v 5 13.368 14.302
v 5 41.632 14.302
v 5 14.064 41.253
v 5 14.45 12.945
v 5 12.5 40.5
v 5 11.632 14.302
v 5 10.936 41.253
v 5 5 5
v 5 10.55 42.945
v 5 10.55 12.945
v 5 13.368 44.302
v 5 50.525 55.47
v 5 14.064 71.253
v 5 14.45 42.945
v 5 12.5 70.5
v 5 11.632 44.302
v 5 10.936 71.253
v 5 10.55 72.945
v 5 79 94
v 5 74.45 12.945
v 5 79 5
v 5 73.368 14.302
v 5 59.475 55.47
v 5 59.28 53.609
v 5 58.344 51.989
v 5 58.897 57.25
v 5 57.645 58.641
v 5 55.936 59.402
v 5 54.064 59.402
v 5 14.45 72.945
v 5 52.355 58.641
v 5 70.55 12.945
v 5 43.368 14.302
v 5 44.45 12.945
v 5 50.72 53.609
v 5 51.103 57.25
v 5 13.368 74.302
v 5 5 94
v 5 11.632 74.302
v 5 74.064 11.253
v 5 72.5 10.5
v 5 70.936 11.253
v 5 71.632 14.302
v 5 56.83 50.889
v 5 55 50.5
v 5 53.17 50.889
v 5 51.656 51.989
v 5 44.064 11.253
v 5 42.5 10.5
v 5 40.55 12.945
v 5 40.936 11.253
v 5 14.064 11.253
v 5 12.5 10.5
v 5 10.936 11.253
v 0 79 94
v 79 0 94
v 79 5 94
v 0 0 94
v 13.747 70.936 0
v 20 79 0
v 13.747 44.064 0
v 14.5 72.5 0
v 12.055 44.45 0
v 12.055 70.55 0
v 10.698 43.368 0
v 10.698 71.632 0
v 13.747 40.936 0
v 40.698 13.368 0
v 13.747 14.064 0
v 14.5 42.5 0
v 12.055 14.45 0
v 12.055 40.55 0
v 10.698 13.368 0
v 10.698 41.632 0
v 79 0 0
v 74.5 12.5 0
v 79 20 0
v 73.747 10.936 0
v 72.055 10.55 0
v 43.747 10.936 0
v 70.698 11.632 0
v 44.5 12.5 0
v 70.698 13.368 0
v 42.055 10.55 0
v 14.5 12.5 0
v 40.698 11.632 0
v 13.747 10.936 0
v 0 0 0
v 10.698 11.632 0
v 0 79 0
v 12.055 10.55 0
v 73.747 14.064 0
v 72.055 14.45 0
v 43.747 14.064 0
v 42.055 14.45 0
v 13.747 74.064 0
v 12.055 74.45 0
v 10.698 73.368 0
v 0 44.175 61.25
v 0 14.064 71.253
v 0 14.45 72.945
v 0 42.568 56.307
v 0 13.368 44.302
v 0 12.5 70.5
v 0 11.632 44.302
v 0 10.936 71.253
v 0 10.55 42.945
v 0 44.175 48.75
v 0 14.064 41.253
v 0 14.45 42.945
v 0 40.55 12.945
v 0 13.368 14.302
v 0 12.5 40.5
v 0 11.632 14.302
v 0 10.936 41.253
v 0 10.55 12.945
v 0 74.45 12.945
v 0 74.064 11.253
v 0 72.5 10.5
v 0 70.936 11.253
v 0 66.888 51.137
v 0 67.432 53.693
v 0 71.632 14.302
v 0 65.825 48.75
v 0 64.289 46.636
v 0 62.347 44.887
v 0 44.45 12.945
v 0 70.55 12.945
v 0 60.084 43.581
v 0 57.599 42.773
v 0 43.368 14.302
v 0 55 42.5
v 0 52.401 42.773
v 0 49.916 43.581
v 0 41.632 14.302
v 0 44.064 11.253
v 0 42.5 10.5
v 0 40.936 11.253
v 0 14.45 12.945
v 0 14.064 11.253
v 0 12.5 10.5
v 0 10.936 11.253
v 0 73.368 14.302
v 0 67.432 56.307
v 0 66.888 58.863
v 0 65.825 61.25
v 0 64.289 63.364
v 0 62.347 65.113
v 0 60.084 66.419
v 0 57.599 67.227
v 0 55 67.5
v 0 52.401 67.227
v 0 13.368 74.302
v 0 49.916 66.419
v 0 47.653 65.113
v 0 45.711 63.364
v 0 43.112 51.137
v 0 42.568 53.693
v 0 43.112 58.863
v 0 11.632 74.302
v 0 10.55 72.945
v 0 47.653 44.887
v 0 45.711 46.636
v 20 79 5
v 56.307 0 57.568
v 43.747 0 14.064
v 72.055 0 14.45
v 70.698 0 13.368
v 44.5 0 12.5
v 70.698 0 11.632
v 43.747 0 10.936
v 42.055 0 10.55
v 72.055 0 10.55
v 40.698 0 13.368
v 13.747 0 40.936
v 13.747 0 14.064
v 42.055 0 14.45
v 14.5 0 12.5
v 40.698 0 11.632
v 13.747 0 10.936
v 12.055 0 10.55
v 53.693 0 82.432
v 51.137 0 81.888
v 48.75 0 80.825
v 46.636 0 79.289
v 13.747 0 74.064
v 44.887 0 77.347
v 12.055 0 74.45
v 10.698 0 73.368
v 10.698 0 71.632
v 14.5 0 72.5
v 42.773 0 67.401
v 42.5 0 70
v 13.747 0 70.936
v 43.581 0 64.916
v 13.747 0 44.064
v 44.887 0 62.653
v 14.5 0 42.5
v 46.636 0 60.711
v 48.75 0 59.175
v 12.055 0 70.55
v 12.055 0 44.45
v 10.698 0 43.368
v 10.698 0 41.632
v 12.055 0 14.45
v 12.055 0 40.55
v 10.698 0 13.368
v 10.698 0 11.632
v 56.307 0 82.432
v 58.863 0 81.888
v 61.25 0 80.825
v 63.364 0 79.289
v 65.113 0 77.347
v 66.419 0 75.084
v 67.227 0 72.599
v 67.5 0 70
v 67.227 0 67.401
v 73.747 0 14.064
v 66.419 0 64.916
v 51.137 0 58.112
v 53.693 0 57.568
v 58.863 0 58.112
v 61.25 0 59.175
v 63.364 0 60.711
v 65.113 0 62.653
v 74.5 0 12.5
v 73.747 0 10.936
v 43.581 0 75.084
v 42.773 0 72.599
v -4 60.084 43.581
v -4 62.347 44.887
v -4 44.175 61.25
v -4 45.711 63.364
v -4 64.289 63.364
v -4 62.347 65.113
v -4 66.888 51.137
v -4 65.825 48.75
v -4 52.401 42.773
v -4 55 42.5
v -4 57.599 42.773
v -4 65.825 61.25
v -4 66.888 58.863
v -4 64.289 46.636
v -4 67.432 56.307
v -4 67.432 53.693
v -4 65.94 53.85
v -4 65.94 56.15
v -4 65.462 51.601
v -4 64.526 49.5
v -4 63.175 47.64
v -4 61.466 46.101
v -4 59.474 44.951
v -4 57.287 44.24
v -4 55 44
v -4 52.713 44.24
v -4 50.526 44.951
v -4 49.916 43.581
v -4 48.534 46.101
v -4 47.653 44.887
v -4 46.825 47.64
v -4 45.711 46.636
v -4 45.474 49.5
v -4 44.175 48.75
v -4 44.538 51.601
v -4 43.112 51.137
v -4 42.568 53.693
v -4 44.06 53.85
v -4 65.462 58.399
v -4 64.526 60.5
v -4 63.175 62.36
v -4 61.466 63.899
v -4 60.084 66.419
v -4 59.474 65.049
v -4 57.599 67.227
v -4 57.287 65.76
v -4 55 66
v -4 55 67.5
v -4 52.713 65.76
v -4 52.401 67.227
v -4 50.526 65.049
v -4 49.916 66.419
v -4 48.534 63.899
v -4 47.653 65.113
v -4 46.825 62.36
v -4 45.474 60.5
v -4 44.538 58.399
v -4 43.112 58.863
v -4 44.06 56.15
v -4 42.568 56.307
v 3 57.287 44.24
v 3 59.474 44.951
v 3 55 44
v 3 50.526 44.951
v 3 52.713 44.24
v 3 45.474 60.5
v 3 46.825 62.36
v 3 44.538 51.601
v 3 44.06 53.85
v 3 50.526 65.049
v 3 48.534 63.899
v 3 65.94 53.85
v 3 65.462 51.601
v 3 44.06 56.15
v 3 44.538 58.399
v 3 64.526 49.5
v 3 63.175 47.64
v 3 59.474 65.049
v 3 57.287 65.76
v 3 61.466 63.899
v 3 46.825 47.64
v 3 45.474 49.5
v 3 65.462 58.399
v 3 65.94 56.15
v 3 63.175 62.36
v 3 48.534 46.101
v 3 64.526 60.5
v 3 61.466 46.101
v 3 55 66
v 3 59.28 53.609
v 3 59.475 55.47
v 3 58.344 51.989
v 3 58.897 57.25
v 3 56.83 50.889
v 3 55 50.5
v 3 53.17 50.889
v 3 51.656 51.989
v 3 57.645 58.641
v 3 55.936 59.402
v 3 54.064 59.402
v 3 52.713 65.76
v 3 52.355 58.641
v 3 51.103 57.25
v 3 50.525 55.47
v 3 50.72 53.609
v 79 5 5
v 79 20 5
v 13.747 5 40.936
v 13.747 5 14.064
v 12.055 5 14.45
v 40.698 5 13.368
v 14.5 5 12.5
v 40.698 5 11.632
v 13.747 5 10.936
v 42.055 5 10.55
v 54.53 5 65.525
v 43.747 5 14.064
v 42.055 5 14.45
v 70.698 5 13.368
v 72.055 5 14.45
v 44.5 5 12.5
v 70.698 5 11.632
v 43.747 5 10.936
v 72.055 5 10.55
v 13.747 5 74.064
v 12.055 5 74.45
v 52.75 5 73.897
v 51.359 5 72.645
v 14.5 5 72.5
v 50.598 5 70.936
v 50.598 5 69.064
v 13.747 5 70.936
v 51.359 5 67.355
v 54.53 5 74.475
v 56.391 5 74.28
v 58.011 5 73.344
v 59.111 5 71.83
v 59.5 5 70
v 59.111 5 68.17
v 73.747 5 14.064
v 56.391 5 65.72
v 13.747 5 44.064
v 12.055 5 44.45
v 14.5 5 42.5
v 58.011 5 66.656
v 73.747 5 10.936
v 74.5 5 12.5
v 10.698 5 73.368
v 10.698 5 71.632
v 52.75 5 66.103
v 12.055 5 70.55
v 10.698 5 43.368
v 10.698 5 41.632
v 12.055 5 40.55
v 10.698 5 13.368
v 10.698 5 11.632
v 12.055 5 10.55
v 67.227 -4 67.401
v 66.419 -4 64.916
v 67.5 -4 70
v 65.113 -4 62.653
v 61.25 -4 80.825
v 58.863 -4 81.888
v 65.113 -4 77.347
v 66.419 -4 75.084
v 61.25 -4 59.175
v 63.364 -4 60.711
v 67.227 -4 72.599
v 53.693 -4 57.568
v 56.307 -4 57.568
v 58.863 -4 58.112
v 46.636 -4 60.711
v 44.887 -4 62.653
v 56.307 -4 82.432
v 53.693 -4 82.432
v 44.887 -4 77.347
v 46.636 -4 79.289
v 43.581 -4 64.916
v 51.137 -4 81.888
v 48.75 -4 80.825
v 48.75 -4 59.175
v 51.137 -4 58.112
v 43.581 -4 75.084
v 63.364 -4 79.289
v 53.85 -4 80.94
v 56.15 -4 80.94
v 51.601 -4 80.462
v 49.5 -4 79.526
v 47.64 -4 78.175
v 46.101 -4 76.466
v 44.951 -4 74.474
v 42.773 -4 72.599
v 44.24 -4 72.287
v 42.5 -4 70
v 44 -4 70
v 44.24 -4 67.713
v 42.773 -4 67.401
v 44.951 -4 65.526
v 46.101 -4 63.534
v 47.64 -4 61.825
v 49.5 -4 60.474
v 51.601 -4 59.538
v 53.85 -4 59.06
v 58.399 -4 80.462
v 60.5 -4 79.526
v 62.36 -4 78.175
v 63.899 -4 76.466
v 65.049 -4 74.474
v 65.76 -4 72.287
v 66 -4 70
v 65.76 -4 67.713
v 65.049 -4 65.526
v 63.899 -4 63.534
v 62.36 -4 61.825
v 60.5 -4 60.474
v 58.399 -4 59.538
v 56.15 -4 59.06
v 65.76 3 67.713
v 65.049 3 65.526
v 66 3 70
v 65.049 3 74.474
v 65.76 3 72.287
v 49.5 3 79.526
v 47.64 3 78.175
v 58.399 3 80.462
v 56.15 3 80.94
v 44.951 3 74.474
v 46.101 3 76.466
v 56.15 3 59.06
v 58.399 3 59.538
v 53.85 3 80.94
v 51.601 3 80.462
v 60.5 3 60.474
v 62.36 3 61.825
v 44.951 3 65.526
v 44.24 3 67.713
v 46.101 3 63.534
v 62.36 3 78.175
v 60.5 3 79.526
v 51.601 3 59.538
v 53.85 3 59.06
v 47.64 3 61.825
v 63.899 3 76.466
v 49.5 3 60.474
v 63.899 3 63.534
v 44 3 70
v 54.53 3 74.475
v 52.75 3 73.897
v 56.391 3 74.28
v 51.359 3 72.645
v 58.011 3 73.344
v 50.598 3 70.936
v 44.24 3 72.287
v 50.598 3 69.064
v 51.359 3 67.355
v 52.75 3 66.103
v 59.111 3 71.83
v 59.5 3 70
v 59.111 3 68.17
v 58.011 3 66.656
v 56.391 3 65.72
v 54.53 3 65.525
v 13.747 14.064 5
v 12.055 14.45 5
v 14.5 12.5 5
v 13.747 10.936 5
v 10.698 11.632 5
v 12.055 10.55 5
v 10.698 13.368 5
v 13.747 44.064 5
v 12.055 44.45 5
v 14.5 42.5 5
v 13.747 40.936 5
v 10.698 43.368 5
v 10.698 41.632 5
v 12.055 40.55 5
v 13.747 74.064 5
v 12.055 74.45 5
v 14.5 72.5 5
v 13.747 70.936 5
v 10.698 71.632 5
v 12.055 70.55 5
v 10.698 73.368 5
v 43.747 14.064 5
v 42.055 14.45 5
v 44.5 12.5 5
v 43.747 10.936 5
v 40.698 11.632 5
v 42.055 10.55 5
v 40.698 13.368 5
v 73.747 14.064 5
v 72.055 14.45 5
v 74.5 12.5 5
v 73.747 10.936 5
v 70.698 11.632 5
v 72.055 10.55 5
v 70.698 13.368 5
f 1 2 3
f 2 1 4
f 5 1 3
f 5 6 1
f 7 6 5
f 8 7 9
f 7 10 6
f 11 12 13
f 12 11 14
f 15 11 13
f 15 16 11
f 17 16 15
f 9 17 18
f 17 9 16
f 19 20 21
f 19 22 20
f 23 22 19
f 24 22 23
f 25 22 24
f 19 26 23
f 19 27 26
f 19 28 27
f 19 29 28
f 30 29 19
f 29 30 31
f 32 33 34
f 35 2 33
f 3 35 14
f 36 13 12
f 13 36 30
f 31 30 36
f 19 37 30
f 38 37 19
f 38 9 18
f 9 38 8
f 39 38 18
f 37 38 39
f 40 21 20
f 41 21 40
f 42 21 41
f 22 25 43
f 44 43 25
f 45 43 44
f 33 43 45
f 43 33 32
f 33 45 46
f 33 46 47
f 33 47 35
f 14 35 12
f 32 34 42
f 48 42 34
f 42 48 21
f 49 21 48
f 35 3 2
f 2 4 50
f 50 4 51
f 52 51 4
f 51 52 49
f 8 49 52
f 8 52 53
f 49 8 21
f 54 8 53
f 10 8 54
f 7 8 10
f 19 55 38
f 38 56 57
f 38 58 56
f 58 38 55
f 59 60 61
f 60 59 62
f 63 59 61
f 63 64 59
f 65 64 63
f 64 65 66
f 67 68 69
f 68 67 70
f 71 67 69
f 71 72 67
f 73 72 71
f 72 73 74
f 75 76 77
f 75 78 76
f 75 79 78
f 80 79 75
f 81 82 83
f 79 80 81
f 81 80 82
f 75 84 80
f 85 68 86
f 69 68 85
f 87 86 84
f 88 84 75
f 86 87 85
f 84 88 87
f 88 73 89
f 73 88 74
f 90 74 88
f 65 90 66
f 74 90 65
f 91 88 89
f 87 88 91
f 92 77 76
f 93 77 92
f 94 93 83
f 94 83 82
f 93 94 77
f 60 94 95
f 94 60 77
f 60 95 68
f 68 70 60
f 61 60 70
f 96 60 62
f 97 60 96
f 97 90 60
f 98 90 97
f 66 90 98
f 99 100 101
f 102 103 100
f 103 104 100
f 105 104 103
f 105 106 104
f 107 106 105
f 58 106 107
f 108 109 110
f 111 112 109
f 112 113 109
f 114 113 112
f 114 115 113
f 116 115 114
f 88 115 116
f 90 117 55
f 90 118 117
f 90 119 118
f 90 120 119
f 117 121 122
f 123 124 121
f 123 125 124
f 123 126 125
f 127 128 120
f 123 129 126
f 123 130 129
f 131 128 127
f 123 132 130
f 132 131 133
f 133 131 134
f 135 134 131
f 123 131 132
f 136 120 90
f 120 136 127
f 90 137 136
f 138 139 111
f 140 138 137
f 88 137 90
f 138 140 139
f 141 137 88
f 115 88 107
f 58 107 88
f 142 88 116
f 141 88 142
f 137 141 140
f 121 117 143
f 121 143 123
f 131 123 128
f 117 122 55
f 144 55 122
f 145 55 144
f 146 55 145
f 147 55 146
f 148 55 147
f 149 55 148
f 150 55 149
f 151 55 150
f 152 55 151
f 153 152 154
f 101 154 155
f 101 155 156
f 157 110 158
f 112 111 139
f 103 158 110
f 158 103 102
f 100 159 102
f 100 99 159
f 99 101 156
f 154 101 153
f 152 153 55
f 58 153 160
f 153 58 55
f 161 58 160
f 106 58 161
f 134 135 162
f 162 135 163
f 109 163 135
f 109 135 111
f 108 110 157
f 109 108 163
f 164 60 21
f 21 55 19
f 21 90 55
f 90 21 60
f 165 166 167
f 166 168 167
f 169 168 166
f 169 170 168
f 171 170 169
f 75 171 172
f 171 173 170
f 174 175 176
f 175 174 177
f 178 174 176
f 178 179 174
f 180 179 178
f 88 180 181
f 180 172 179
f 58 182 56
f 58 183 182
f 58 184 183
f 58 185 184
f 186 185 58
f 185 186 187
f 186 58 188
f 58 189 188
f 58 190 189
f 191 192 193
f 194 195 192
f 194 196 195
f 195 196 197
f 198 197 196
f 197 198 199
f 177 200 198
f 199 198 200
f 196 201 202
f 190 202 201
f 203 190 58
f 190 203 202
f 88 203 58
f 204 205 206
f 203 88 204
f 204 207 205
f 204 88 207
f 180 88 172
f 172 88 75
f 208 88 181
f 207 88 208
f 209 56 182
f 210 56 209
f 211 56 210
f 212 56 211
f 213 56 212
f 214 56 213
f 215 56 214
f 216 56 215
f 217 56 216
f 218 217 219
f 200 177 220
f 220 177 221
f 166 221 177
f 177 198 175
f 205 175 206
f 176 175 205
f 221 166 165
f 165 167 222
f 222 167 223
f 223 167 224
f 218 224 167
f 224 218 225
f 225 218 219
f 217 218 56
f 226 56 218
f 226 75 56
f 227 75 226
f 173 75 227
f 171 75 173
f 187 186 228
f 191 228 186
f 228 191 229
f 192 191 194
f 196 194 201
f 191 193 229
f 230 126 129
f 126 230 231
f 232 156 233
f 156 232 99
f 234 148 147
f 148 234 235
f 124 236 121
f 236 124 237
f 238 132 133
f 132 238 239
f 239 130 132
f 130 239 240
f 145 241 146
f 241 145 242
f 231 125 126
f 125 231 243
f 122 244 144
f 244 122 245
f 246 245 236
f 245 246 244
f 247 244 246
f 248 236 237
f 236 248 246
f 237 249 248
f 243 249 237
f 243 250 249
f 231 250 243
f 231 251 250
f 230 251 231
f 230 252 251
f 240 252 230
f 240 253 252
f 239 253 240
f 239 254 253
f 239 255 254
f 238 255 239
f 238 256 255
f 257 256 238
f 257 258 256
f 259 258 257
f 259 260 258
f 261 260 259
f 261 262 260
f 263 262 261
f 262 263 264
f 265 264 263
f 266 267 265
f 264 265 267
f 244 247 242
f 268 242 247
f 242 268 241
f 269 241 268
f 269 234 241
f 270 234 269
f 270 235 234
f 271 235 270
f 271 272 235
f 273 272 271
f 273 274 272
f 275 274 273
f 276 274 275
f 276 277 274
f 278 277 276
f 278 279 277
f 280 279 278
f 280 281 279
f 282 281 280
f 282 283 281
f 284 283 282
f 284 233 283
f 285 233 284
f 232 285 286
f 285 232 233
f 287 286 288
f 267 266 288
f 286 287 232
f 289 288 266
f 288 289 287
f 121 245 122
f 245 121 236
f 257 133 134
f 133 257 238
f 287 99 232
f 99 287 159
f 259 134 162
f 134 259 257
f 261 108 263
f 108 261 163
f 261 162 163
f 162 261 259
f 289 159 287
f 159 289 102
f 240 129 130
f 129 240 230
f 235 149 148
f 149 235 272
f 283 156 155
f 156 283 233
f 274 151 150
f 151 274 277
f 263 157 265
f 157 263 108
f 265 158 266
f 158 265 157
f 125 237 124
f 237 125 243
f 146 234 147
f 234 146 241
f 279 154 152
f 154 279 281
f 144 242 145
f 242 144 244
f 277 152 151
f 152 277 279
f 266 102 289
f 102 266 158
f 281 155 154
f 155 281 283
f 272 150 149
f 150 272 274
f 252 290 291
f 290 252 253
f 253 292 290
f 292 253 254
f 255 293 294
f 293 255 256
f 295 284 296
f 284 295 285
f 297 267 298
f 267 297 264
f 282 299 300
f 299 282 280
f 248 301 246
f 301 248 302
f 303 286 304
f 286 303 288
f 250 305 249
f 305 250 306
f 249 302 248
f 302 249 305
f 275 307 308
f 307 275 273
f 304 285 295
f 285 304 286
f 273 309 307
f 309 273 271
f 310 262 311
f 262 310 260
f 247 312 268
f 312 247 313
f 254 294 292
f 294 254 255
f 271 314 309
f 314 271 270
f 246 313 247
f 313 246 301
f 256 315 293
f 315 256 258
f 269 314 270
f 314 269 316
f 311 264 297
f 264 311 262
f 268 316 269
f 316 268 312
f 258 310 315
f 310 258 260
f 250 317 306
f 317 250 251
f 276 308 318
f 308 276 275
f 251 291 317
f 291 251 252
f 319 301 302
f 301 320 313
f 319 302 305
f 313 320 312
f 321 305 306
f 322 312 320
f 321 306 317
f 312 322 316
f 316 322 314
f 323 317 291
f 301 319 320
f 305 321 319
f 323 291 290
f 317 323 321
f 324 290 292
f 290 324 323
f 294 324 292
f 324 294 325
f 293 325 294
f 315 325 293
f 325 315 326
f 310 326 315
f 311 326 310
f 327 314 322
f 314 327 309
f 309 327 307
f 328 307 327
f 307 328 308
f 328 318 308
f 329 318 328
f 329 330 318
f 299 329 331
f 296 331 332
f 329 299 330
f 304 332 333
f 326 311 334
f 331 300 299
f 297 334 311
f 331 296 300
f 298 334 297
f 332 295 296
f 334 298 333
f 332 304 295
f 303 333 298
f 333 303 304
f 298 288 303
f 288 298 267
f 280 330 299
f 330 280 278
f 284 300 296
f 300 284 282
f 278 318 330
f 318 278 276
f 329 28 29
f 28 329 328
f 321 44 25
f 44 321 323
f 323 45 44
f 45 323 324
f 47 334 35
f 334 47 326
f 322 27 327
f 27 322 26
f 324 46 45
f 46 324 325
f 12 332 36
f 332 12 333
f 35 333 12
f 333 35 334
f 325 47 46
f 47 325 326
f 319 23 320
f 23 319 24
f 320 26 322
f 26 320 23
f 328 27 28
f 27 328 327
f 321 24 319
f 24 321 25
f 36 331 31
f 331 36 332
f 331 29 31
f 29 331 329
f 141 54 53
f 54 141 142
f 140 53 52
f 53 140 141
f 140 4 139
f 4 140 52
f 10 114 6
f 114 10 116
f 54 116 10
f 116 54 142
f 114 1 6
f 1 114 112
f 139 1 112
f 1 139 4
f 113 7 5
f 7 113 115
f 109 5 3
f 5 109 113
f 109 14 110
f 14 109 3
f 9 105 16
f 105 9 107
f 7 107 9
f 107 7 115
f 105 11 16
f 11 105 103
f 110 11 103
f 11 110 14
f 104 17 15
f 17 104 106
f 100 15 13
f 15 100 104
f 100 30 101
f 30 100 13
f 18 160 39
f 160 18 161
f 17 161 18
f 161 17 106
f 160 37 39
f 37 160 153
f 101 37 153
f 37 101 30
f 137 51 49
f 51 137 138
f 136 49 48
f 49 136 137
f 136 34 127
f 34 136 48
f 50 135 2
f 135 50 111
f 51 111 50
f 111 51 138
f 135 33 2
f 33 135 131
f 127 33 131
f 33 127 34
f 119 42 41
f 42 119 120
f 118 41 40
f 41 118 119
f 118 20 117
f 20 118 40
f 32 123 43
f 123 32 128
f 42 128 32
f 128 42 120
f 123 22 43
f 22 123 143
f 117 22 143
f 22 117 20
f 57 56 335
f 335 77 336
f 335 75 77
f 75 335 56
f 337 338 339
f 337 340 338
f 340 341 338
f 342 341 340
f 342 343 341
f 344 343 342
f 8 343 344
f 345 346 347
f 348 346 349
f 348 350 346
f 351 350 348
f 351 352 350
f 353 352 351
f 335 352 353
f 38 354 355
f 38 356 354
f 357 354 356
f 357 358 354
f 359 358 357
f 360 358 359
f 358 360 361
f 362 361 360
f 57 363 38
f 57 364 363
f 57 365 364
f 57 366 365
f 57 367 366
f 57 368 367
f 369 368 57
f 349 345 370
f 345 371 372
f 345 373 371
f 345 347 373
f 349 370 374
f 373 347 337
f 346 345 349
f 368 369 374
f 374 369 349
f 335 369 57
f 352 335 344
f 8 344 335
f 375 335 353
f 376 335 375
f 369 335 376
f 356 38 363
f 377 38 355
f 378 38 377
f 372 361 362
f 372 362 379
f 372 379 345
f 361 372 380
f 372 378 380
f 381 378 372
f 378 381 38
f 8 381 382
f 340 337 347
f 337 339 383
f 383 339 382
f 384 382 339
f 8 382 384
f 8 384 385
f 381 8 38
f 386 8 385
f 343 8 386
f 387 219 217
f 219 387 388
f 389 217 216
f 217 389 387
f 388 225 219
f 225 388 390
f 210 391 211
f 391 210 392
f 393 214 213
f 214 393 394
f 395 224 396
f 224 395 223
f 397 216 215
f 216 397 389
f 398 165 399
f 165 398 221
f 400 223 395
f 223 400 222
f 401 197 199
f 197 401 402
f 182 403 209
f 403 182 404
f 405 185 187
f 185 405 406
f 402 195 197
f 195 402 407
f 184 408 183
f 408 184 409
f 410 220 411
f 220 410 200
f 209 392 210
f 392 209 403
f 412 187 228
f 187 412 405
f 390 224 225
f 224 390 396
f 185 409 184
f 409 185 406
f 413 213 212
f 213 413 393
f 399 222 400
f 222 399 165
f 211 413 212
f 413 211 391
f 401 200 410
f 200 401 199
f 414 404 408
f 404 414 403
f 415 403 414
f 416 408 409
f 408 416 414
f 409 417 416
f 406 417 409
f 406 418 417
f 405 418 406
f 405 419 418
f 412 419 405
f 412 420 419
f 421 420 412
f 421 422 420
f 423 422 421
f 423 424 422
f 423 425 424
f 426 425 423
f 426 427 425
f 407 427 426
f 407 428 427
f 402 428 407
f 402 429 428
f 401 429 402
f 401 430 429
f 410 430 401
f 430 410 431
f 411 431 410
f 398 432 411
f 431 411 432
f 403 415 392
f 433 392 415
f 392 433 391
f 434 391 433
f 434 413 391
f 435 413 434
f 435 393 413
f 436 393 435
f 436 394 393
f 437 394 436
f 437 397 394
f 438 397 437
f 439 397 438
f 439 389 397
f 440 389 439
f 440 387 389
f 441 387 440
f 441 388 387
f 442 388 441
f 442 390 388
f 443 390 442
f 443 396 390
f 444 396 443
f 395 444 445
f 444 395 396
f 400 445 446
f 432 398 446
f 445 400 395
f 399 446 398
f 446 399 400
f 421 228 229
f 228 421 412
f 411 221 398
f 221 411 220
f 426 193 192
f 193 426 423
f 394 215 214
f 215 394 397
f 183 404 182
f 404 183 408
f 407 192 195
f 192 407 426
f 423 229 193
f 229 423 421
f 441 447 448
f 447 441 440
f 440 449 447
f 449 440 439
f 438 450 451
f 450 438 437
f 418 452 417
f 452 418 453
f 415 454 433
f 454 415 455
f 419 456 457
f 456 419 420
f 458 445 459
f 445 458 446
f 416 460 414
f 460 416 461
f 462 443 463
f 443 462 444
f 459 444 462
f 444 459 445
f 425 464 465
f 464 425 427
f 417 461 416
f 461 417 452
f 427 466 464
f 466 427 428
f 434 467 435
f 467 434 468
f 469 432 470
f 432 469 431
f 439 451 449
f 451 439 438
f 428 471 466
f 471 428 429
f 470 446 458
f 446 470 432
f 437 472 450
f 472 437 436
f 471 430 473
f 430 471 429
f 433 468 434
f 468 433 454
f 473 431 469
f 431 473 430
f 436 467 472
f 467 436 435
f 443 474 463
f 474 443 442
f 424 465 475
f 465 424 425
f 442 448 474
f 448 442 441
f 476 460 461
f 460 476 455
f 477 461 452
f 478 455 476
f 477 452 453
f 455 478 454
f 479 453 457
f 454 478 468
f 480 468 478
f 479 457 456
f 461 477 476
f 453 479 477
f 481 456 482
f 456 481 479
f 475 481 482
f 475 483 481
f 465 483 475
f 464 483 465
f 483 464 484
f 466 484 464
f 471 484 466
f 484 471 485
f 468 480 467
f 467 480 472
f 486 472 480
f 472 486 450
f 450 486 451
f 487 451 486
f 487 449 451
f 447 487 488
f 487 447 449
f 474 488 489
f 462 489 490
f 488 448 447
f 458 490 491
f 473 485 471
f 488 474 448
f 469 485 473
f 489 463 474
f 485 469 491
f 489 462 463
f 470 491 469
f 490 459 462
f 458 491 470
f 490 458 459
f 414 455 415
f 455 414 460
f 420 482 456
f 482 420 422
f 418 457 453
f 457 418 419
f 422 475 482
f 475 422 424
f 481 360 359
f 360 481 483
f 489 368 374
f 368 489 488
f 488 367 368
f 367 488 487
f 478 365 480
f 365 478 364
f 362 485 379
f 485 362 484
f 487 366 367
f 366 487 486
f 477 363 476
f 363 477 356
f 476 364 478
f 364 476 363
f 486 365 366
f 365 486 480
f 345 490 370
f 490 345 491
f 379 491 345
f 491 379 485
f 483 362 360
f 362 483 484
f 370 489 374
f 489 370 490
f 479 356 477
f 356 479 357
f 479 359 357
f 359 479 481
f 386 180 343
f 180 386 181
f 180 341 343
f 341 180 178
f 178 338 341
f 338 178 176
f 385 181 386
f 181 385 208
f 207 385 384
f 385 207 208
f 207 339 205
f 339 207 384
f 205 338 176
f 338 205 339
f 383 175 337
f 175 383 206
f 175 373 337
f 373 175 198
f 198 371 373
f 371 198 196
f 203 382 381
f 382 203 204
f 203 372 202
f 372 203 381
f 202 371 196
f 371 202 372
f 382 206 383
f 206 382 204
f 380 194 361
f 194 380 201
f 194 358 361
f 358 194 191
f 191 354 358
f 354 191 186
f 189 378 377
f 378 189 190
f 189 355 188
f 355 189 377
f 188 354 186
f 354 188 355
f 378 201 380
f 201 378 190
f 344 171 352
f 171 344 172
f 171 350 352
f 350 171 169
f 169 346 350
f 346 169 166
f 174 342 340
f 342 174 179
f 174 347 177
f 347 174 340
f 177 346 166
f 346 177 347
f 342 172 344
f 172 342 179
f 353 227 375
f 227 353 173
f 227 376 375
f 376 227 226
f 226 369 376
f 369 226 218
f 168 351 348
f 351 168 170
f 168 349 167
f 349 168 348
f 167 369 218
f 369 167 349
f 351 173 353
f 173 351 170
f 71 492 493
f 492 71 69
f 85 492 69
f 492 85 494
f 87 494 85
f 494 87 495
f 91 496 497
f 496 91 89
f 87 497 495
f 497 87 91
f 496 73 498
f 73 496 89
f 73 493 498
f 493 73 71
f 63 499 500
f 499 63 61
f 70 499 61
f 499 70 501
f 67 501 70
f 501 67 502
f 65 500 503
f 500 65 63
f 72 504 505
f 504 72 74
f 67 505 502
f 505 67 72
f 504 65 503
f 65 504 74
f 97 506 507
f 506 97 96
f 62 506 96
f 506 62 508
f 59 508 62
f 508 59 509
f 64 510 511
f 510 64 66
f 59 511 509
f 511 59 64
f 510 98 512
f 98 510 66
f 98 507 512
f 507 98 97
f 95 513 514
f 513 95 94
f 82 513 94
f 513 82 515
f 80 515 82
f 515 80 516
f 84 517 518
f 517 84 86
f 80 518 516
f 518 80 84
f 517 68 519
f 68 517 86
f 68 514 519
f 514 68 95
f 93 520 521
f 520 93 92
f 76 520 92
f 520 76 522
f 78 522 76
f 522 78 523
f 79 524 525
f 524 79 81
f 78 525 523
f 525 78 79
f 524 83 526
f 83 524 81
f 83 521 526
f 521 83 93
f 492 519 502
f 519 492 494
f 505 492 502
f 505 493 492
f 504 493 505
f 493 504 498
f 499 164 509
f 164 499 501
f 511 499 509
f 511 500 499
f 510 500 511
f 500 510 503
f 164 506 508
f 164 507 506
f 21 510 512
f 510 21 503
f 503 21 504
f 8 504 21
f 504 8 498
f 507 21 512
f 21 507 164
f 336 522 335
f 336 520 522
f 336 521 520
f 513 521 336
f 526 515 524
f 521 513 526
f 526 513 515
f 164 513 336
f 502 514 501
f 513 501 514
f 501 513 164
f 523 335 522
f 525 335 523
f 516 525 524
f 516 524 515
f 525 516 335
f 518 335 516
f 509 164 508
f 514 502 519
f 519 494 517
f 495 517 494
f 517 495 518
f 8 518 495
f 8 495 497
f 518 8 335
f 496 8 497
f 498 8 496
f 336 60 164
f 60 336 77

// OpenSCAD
// file: 608Mount.scad
module 608Mount(throughDepth, heightOffSurface, wallThickness, transVec, rotVec) {
	difference() {
		union() {
			children();
			translate(transVec)
				rotate(rotVec)
					translate([0,0,-heightOffSurface])
						cylinder(d=22+wallThickness, h=heightOffSurface);
		}
		translate(transVec)
			rotate(rotVec) {
				translate([0,0,-heightOffSurface-.5])
					cylinder(d=22, h=7+.5);
				cylinder(d=9, h=throughDepth+1);
			}
	}
}

608Mount(50.5, 3, 3, [25, 25, 0], [0,0,0])
	cube(size=50);
// main file
use <608Mount.scad>;

XYSpacing = 15;
gearDiam = 50;
bracketThickness = 5;
extrusionThickness = 15;
gearSpacing = 10;
bearingHolderRadius = 14;
exteriorSpace = 10;
screwHoleSpacing = 30;
screwHoleDiam = 4;

bracketHeight = bracketThickness + extrusionThickness + gearDiam / 2 + gearSpacing + XYSpacing + bearingHolderRadius + exteriorSpace;

bracketWidth = bracketThickness + extrusionThickness + gearDiam / 2 + gearSpacing + bearingHolderRadius + exteriorSpace;
difference (){
608Mount(bracketThickness, 4, 3, [0, bracketThickness + extrusionThickness + gearDiam / 2 + gearSpacing, bracketThickness + extrusionThickness + gearDiam / 2 + gearSpacing], [0,90,0]) {
		cube (size = [bracketThickness, bracketWidth, bracketHeight]);
}
for (i = [0: (bracketHeight - bracketThickness) / screwHoleSpacing]) {
	translate ([-.5, bracketThickness + extrusionThickness/2, bracketThickness + extrusionThickness/2 + screwHoleSpacing * i])
		rotate([0,90,0])
			cylinder (h = bracketThickness+1, d = screwHoleDiam);
}
for (i = [0: (bracketWidth - bracketThickness) / screwHoleSpacing]) {
	translate ([-.5, bracketThickness + extrusionThickness/2 + screwHoleSpacing * i, bracketThickness + extrusionThickness/2, ])
		rotate([0,90,0])
			cylinder (h = bracketThickness+1, d = screwHoleDiam);
}
}

difference() {
608Mount(bracketThickness, 4, 3, [bracketThickness + extrusionThickness + gearDiam / 2 + gearSpacing, 0, bracketThickness + extrusionThickness + gearDiam / 2 + gearSpacing + XYSpacing], [-90,0,0]) {
		cube (size = [bracketWidth, bracketThickness, bracketHeight]);
}
for (i = [0: (bracketHeight - bracketThickness) / screwHoleSpacing]) {
	translate ([bracketThickness + extrusionThickness/2, -.5, bracketThickness + extrusionThickness/2 + screwHoleSpacing * i])
		rotate([-90,0,0])
			cylinder (h = bracketThickness+1, d = screwHoleDiam);
}
for (i = [0: (bracketWidth - bracketThickness) / screwHoleSpacing]) {
	translate ([bracketThickness + extrusionThickness/2 + screwHoleSpacing * i, -.5, bracketThickness + extrusionThickness/2, ])
		rotate([-90,0,0])
			cylinder (h = bracketThickness+1, d = screwHoleDiam);
}
}

difference () {
linear_extrude(height=5)
	polygon(points=[[0,0],[bracketWidth,0],[bracketWidth,bracketThickness+extrusionThickness],[bracketThickness+extrusionThickness,bracketWidth],[0,bracketWidth]]);
for (i = [0: (bracketWidth - bracketThickness) / screwHoleSpacing]) {
	translate ([bracketThickness + extrusionThickness/2, bracketThickness + extrusionThickness/2 + screwHoleSpacing * i, - 0.5])
		rotate([0,0,0])
			cylinder (h = bracketThickness+1, d = screwHoleDiam);
}
for (i = [0: (bracketWidth - bracketThickness) / screwHoleSpacing]) {
	translate ([bracketThickness + extrusionThickness/2 + screwHoleSpacing * i, bracketThickness + extrusionThickness/2, -0.5])
		rotate([0,0,0])
			cylinder (h = bracketThickness+1, d = screwHoleDiam);
}
}
